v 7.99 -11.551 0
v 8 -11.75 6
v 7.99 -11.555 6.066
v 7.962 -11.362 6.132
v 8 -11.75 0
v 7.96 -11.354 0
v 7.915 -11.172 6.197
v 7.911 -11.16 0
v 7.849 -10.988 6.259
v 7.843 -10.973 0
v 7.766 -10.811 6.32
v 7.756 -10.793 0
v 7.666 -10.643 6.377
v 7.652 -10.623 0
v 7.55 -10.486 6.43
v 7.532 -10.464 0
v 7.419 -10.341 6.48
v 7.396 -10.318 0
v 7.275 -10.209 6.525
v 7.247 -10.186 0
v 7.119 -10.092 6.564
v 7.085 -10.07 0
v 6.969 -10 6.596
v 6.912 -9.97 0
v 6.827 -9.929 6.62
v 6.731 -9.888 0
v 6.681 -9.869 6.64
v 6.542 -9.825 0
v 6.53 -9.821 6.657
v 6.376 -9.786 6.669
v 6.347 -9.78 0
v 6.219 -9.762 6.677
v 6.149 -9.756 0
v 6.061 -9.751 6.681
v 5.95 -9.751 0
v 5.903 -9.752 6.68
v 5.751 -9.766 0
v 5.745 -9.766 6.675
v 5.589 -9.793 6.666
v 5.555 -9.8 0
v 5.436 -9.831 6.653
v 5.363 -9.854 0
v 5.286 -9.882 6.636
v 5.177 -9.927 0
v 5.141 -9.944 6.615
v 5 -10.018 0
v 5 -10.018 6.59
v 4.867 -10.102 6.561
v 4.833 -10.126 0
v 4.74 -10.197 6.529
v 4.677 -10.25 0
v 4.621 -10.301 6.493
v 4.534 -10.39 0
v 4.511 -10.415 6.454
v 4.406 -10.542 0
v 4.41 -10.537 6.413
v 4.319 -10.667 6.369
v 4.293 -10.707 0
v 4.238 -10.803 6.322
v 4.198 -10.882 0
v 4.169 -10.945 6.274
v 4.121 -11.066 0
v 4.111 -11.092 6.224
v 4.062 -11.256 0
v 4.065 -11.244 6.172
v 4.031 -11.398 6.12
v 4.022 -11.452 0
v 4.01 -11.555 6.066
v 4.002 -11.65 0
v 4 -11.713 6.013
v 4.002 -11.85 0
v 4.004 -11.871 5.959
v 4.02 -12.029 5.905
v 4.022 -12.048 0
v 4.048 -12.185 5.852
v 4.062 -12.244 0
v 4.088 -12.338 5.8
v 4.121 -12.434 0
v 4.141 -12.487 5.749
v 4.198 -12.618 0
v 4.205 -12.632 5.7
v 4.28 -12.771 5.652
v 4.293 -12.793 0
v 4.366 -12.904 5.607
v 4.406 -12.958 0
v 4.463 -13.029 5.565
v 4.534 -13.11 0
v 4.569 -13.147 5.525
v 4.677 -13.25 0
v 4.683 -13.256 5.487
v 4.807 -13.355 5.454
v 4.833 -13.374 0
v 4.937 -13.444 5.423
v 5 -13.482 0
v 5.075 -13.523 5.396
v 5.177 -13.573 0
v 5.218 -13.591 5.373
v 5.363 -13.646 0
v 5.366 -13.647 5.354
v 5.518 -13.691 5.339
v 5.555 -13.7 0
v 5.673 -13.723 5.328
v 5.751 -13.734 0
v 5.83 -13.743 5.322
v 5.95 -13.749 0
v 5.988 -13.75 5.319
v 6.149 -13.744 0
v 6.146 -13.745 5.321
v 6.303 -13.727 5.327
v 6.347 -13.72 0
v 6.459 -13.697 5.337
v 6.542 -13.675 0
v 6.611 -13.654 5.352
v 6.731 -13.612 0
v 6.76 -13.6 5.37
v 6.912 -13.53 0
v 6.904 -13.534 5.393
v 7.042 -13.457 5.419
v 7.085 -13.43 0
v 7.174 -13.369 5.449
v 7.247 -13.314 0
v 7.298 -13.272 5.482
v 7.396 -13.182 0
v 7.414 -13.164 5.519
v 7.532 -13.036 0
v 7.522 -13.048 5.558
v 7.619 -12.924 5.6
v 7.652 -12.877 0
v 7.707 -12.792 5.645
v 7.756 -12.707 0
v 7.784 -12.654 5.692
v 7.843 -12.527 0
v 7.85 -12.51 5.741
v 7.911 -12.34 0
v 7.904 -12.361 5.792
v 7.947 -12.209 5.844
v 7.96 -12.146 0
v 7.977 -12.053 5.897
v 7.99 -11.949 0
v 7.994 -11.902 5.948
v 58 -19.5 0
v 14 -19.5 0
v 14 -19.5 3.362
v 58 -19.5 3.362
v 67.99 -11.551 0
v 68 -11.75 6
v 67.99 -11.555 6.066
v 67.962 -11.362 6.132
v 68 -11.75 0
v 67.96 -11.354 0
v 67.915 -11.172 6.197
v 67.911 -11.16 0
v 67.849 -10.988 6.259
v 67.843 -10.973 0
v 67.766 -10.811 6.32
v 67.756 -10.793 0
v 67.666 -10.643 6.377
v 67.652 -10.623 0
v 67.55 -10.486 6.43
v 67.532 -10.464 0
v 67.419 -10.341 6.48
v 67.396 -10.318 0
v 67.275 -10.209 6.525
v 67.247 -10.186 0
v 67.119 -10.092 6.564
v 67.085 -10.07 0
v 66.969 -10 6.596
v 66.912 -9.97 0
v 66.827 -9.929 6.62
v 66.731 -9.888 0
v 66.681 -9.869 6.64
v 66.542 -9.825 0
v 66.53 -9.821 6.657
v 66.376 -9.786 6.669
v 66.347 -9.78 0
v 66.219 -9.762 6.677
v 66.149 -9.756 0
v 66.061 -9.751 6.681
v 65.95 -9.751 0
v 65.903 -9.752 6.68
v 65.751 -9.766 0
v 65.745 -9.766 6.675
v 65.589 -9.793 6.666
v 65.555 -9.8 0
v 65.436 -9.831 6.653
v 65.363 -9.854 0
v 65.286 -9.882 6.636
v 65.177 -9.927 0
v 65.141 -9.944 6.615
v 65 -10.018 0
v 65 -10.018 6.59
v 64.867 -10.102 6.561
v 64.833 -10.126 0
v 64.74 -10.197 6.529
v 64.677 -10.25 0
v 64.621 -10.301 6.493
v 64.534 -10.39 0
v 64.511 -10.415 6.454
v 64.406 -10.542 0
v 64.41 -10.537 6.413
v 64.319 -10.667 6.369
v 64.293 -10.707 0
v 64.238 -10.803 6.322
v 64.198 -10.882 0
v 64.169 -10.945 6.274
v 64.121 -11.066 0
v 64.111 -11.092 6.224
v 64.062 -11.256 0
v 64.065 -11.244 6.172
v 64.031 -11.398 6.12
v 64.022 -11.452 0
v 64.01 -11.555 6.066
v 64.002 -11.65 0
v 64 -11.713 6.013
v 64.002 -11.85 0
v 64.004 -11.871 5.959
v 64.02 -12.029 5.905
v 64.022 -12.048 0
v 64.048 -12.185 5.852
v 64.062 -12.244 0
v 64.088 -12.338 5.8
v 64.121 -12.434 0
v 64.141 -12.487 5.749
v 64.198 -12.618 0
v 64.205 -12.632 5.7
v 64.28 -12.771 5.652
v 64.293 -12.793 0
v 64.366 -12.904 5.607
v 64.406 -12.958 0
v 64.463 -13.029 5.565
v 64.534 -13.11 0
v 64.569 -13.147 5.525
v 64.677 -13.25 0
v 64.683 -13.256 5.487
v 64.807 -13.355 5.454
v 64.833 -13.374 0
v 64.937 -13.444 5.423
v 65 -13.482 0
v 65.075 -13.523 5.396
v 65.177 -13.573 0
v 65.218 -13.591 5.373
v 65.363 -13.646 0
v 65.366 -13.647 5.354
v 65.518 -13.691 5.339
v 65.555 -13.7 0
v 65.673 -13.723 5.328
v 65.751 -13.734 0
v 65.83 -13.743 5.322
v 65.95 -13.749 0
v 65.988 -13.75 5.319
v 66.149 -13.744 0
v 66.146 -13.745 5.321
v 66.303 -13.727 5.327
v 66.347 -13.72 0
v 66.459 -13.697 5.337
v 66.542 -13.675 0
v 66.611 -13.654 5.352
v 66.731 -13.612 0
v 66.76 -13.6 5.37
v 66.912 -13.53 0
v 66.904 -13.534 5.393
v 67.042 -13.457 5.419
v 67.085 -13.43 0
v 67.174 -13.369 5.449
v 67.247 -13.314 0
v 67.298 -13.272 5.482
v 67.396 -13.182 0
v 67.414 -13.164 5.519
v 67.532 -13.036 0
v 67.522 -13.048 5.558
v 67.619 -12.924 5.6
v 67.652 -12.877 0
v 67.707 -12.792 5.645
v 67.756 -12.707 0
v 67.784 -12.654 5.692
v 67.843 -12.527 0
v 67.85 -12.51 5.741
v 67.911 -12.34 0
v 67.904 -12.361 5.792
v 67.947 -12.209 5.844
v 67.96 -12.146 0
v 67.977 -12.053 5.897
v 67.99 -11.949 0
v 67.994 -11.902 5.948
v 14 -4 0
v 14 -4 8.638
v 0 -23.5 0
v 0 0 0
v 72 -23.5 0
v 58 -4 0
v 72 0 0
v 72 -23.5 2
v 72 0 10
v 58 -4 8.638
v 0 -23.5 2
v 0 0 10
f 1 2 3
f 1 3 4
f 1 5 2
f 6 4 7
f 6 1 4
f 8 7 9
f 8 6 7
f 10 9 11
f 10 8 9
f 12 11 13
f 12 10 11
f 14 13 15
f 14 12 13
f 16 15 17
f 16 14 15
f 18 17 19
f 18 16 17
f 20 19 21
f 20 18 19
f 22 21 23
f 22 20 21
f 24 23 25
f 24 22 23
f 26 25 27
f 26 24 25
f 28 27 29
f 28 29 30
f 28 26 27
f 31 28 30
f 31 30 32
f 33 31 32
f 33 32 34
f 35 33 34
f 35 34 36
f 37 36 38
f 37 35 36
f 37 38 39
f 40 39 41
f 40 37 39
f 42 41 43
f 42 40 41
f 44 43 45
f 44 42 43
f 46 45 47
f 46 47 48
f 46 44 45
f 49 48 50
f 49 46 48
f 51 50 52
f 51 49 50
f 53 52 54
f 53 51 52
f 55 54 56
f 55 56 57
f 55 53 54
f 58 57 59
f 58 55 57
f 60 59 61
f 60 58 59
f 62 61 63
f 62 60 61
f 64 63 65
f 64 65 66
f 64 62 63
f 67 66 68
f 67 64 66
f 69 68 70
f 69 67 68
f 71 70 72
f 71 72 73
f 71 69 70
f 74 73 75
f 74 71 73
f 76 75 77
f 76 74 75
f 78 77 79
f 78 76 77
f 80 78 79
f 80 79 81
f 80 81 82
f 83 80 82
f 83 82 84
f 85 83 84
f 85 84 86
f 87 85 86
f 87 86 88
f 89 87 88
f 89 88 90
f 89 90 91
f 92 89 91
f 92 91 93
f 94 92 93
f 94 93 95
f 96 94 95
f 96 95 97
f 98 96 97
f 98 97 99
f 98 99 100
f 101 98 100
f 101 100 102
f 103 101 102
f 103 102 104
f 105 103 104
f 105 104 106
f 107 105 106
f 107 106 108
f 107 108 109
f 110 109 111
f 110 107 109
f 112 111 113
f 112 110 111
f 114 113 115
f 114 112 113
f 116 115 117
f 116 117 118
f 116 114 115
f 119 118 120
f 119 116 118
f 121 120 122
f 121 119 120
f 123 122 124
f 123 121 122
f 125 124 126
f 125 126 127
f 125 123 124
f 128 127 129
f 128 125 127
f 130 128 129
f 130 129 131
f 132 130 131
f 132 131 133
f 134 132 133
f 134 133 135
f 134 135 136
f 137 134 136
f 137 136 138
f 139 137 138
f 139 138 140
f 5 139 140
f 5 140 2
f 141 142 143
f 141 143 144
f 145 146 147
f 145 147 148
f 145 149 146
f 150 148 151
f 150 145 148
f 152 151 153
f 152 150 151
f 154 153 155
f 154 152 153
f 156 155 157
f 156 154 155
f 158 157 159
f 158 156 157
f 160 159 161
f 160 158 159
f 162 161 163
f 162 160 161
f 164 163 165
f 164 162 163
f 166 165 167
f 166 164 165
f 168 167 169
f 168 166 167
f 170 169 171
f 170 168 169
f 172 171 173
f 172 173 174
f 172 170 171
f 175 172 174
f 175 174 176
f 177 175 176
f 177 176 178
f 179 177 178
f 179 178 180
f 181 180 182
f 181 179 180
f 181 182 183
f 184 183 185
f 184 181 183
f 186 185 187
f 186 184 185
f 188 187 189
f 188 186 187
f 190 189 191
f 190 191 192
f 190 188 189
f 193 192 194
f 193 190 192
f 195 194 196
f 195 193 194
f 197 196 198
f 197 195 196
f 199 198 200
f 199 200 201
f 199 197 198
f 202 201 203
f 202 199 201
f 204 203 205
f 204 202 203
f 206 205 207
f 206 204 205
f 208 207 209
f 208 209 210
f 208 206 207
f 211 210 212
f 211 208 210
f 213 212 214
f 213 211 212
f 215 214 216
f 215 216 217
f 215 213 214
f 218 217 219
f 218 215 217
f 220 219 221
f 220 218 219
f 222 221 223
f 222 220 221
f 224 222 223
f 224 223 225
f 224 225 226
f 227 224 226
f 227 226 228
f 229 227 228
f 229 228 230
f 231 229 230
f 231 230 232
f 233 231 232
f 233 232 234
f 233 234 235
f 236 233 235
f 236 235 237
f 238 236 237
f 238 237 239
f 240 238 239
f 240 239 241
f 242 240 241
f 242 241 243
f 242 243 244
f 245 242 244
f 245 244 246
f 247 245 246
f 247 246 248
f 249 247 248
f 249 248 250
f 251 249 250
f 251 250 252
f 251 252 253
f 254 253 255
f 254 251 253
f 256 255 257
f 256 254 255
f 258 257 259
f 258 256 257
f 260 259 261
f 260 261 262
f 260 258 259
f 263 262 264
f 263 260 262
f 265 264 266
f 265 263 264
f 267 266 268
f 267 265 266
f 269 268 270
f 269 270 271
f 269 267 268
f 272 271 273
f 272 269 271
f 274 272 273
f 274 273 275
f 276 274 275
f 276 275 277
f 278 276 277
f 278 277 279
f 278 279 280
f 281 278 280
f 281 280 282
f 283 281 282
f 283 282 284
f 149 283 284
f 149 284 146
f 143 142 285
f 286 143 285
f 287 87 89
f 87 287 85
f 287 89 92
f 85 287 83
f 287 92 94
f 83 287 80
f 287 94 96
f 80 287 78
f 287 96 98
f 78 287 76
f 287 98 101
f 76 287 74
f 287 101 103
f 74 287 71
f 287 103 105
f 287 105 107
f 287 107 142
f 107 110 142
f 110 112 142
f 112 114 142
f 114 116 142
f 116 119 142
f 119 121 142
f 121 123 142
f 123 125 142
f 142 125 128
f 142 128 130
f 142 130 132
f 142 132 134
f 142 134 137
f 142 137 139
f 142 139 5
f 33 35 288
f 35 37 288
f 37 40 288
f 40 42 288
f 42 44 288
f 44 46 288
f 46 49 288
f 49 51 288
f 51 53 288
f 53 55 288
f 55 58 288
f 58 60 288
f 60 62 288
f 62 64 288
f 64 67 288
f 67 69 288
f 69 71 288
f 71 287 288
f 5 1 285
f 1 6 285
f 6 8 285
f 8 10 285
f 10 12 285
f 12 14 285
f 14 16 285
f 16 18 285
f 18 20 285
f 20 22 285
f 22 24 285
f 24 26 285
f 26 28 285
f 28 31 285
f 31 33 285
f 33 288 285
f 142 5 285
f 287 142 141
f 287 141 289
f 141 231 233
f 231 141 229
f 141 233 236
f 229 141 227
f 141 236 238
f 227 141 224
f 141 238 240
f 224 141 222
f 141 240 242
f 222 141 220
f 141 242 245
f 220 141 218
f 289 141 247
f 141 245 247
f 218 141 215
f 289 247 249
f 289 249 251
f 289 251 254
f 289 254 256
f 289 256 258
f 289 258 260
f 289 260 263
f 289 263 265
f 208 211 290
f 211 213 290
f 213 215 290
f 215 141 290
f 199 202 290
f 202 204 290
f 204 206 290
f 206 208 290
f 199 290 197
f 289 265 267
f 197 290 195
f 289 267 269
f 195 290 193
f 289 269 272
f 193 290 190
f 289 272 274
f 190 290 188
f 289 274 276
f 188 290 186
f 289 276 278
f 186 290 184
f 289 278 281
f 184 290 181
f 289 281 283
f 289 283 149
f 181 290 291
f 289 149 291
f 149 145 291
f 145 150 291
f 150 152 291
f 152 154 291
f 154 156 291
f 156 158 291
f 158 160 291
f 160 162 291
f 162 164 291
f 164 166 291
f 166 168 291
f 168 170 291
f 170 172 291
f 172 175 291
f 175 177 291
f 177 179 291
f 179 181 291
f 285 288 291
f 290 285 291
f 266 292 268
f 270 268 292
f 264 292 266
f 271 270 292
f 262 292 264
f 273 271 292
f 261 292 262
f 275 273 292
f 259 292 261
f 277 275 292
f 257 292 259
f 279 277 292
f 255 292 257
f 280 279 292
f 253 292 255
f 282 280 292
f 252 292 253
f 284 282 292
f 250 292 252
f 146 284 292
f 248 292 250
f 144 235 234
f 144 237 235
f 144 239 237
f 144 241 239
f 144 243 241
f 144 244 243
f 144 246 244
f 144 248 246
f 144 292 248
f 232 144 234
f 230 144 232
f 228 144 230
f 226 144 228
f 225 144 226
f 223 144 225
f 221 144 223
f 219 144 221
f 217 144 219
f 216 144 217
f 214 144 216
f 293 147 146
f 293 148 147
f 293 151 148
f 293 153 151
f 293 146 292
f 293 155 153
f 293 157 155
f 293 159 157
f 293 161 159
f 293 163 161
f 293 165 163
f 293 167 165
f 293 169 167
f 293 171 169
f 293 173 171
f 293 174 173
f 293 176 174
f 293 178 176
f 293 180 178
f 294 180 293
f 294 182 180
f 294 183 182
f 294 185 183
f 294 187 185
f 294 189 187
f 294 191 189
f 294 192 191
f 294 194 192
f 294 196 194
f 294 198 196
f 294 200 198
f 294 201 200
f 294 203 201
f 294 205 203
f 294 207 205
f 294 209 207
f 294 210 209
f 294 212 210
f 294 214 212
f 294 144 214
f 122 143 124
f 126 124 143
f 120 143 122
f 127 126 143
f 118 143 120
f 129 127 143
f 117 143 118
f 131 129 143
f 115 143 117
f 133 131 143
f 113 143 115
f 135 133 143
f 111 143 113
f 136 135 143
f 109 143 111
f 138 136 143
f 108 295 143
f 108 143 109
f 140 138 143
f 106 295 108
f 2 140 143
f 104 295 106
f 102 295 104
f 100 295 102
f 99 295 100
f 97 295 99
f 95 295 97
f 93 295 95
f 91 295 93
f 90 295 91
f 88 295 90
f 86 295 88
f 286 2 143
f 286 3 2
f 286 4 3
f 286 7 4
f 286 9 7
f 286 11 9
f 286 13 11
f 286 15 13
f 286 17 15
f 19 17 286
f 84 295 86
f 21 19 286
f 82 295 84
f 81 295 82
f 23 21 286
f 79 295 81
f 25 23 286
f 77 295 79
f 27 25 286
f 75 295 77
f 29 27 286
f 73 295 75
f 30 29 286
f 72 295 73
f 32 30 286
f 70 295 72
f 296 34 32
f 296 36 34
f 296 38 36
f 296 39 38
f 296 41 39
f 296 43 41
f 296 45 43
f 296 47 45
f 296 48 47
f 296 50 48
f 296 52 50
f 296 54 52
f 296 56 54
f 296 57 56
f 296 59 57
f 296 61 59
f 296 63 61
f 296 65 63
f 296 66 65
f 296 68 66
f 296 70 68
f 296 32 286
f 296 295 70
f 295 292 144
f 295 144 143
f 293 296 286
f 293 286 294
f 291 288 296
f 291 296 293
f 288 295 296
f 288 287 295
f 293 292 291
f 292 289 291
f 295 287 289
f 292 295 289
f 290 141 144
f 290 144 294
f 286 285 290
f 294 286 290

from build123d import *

# Parameters (mm, degrees)
F0_W        = 72
F0_H        = 23.5
F0_R        = 2
F0_W_2      = 44
F0_H_2      = 15.5
F1_DEPTH    = 2
F2_DEPTH    = 8
F3_T1_DEPTH = 193.9586602962


# Not quite as in the source:
# - a fillet or chamfer that OpenCascade refuses, or shapes differently, is made with other operations: its cross-section is extruded or revolved along the edge and cut away or added


with BuildPart() as f1:
    # F0 (on Top) → F1 (new body)
    with BuildSketch(Plane.XY):
        with Locations((36, -11.75)):
            Rectangle(F0_W, F0_H)
        with Locations((6, -11.75)):
            Circle(F0_R, mode=Mode.SUBTRACT)
        with Locations((36, -11.75)):
            Rectangle(F0_W_2, F0_H_2, mode=Mode.SUBTRACT)
        with Locations((66, -11.75)):
            Circle(F0_R, mode=Mode.SUBTRACT)
    extrude(amount=F1_DEPTH)

    # F2 (add): a face of the model
    f2_faces = [f1.faces().sort_by_distance(p)[0] for p in [
        (36, -0.7573803536, 2),
    ]]
    extrude(f2_faces, amount=F2_DEPTH)

    # F3: chamfer of 23.5 x 8 on 1 edges, made by hand

    # F3_s2 → F3_t1 (cut)
    with BuildSketch(Plane.YZ.offset(-60.9793301481)):
        Polygon((-23.5, 2), (0, 10), (-23.5, 10), align=None)
    extrude(amount=F3_T1_DEPTH, mode=Mode.SUBTRACT)


solid = f1.part
